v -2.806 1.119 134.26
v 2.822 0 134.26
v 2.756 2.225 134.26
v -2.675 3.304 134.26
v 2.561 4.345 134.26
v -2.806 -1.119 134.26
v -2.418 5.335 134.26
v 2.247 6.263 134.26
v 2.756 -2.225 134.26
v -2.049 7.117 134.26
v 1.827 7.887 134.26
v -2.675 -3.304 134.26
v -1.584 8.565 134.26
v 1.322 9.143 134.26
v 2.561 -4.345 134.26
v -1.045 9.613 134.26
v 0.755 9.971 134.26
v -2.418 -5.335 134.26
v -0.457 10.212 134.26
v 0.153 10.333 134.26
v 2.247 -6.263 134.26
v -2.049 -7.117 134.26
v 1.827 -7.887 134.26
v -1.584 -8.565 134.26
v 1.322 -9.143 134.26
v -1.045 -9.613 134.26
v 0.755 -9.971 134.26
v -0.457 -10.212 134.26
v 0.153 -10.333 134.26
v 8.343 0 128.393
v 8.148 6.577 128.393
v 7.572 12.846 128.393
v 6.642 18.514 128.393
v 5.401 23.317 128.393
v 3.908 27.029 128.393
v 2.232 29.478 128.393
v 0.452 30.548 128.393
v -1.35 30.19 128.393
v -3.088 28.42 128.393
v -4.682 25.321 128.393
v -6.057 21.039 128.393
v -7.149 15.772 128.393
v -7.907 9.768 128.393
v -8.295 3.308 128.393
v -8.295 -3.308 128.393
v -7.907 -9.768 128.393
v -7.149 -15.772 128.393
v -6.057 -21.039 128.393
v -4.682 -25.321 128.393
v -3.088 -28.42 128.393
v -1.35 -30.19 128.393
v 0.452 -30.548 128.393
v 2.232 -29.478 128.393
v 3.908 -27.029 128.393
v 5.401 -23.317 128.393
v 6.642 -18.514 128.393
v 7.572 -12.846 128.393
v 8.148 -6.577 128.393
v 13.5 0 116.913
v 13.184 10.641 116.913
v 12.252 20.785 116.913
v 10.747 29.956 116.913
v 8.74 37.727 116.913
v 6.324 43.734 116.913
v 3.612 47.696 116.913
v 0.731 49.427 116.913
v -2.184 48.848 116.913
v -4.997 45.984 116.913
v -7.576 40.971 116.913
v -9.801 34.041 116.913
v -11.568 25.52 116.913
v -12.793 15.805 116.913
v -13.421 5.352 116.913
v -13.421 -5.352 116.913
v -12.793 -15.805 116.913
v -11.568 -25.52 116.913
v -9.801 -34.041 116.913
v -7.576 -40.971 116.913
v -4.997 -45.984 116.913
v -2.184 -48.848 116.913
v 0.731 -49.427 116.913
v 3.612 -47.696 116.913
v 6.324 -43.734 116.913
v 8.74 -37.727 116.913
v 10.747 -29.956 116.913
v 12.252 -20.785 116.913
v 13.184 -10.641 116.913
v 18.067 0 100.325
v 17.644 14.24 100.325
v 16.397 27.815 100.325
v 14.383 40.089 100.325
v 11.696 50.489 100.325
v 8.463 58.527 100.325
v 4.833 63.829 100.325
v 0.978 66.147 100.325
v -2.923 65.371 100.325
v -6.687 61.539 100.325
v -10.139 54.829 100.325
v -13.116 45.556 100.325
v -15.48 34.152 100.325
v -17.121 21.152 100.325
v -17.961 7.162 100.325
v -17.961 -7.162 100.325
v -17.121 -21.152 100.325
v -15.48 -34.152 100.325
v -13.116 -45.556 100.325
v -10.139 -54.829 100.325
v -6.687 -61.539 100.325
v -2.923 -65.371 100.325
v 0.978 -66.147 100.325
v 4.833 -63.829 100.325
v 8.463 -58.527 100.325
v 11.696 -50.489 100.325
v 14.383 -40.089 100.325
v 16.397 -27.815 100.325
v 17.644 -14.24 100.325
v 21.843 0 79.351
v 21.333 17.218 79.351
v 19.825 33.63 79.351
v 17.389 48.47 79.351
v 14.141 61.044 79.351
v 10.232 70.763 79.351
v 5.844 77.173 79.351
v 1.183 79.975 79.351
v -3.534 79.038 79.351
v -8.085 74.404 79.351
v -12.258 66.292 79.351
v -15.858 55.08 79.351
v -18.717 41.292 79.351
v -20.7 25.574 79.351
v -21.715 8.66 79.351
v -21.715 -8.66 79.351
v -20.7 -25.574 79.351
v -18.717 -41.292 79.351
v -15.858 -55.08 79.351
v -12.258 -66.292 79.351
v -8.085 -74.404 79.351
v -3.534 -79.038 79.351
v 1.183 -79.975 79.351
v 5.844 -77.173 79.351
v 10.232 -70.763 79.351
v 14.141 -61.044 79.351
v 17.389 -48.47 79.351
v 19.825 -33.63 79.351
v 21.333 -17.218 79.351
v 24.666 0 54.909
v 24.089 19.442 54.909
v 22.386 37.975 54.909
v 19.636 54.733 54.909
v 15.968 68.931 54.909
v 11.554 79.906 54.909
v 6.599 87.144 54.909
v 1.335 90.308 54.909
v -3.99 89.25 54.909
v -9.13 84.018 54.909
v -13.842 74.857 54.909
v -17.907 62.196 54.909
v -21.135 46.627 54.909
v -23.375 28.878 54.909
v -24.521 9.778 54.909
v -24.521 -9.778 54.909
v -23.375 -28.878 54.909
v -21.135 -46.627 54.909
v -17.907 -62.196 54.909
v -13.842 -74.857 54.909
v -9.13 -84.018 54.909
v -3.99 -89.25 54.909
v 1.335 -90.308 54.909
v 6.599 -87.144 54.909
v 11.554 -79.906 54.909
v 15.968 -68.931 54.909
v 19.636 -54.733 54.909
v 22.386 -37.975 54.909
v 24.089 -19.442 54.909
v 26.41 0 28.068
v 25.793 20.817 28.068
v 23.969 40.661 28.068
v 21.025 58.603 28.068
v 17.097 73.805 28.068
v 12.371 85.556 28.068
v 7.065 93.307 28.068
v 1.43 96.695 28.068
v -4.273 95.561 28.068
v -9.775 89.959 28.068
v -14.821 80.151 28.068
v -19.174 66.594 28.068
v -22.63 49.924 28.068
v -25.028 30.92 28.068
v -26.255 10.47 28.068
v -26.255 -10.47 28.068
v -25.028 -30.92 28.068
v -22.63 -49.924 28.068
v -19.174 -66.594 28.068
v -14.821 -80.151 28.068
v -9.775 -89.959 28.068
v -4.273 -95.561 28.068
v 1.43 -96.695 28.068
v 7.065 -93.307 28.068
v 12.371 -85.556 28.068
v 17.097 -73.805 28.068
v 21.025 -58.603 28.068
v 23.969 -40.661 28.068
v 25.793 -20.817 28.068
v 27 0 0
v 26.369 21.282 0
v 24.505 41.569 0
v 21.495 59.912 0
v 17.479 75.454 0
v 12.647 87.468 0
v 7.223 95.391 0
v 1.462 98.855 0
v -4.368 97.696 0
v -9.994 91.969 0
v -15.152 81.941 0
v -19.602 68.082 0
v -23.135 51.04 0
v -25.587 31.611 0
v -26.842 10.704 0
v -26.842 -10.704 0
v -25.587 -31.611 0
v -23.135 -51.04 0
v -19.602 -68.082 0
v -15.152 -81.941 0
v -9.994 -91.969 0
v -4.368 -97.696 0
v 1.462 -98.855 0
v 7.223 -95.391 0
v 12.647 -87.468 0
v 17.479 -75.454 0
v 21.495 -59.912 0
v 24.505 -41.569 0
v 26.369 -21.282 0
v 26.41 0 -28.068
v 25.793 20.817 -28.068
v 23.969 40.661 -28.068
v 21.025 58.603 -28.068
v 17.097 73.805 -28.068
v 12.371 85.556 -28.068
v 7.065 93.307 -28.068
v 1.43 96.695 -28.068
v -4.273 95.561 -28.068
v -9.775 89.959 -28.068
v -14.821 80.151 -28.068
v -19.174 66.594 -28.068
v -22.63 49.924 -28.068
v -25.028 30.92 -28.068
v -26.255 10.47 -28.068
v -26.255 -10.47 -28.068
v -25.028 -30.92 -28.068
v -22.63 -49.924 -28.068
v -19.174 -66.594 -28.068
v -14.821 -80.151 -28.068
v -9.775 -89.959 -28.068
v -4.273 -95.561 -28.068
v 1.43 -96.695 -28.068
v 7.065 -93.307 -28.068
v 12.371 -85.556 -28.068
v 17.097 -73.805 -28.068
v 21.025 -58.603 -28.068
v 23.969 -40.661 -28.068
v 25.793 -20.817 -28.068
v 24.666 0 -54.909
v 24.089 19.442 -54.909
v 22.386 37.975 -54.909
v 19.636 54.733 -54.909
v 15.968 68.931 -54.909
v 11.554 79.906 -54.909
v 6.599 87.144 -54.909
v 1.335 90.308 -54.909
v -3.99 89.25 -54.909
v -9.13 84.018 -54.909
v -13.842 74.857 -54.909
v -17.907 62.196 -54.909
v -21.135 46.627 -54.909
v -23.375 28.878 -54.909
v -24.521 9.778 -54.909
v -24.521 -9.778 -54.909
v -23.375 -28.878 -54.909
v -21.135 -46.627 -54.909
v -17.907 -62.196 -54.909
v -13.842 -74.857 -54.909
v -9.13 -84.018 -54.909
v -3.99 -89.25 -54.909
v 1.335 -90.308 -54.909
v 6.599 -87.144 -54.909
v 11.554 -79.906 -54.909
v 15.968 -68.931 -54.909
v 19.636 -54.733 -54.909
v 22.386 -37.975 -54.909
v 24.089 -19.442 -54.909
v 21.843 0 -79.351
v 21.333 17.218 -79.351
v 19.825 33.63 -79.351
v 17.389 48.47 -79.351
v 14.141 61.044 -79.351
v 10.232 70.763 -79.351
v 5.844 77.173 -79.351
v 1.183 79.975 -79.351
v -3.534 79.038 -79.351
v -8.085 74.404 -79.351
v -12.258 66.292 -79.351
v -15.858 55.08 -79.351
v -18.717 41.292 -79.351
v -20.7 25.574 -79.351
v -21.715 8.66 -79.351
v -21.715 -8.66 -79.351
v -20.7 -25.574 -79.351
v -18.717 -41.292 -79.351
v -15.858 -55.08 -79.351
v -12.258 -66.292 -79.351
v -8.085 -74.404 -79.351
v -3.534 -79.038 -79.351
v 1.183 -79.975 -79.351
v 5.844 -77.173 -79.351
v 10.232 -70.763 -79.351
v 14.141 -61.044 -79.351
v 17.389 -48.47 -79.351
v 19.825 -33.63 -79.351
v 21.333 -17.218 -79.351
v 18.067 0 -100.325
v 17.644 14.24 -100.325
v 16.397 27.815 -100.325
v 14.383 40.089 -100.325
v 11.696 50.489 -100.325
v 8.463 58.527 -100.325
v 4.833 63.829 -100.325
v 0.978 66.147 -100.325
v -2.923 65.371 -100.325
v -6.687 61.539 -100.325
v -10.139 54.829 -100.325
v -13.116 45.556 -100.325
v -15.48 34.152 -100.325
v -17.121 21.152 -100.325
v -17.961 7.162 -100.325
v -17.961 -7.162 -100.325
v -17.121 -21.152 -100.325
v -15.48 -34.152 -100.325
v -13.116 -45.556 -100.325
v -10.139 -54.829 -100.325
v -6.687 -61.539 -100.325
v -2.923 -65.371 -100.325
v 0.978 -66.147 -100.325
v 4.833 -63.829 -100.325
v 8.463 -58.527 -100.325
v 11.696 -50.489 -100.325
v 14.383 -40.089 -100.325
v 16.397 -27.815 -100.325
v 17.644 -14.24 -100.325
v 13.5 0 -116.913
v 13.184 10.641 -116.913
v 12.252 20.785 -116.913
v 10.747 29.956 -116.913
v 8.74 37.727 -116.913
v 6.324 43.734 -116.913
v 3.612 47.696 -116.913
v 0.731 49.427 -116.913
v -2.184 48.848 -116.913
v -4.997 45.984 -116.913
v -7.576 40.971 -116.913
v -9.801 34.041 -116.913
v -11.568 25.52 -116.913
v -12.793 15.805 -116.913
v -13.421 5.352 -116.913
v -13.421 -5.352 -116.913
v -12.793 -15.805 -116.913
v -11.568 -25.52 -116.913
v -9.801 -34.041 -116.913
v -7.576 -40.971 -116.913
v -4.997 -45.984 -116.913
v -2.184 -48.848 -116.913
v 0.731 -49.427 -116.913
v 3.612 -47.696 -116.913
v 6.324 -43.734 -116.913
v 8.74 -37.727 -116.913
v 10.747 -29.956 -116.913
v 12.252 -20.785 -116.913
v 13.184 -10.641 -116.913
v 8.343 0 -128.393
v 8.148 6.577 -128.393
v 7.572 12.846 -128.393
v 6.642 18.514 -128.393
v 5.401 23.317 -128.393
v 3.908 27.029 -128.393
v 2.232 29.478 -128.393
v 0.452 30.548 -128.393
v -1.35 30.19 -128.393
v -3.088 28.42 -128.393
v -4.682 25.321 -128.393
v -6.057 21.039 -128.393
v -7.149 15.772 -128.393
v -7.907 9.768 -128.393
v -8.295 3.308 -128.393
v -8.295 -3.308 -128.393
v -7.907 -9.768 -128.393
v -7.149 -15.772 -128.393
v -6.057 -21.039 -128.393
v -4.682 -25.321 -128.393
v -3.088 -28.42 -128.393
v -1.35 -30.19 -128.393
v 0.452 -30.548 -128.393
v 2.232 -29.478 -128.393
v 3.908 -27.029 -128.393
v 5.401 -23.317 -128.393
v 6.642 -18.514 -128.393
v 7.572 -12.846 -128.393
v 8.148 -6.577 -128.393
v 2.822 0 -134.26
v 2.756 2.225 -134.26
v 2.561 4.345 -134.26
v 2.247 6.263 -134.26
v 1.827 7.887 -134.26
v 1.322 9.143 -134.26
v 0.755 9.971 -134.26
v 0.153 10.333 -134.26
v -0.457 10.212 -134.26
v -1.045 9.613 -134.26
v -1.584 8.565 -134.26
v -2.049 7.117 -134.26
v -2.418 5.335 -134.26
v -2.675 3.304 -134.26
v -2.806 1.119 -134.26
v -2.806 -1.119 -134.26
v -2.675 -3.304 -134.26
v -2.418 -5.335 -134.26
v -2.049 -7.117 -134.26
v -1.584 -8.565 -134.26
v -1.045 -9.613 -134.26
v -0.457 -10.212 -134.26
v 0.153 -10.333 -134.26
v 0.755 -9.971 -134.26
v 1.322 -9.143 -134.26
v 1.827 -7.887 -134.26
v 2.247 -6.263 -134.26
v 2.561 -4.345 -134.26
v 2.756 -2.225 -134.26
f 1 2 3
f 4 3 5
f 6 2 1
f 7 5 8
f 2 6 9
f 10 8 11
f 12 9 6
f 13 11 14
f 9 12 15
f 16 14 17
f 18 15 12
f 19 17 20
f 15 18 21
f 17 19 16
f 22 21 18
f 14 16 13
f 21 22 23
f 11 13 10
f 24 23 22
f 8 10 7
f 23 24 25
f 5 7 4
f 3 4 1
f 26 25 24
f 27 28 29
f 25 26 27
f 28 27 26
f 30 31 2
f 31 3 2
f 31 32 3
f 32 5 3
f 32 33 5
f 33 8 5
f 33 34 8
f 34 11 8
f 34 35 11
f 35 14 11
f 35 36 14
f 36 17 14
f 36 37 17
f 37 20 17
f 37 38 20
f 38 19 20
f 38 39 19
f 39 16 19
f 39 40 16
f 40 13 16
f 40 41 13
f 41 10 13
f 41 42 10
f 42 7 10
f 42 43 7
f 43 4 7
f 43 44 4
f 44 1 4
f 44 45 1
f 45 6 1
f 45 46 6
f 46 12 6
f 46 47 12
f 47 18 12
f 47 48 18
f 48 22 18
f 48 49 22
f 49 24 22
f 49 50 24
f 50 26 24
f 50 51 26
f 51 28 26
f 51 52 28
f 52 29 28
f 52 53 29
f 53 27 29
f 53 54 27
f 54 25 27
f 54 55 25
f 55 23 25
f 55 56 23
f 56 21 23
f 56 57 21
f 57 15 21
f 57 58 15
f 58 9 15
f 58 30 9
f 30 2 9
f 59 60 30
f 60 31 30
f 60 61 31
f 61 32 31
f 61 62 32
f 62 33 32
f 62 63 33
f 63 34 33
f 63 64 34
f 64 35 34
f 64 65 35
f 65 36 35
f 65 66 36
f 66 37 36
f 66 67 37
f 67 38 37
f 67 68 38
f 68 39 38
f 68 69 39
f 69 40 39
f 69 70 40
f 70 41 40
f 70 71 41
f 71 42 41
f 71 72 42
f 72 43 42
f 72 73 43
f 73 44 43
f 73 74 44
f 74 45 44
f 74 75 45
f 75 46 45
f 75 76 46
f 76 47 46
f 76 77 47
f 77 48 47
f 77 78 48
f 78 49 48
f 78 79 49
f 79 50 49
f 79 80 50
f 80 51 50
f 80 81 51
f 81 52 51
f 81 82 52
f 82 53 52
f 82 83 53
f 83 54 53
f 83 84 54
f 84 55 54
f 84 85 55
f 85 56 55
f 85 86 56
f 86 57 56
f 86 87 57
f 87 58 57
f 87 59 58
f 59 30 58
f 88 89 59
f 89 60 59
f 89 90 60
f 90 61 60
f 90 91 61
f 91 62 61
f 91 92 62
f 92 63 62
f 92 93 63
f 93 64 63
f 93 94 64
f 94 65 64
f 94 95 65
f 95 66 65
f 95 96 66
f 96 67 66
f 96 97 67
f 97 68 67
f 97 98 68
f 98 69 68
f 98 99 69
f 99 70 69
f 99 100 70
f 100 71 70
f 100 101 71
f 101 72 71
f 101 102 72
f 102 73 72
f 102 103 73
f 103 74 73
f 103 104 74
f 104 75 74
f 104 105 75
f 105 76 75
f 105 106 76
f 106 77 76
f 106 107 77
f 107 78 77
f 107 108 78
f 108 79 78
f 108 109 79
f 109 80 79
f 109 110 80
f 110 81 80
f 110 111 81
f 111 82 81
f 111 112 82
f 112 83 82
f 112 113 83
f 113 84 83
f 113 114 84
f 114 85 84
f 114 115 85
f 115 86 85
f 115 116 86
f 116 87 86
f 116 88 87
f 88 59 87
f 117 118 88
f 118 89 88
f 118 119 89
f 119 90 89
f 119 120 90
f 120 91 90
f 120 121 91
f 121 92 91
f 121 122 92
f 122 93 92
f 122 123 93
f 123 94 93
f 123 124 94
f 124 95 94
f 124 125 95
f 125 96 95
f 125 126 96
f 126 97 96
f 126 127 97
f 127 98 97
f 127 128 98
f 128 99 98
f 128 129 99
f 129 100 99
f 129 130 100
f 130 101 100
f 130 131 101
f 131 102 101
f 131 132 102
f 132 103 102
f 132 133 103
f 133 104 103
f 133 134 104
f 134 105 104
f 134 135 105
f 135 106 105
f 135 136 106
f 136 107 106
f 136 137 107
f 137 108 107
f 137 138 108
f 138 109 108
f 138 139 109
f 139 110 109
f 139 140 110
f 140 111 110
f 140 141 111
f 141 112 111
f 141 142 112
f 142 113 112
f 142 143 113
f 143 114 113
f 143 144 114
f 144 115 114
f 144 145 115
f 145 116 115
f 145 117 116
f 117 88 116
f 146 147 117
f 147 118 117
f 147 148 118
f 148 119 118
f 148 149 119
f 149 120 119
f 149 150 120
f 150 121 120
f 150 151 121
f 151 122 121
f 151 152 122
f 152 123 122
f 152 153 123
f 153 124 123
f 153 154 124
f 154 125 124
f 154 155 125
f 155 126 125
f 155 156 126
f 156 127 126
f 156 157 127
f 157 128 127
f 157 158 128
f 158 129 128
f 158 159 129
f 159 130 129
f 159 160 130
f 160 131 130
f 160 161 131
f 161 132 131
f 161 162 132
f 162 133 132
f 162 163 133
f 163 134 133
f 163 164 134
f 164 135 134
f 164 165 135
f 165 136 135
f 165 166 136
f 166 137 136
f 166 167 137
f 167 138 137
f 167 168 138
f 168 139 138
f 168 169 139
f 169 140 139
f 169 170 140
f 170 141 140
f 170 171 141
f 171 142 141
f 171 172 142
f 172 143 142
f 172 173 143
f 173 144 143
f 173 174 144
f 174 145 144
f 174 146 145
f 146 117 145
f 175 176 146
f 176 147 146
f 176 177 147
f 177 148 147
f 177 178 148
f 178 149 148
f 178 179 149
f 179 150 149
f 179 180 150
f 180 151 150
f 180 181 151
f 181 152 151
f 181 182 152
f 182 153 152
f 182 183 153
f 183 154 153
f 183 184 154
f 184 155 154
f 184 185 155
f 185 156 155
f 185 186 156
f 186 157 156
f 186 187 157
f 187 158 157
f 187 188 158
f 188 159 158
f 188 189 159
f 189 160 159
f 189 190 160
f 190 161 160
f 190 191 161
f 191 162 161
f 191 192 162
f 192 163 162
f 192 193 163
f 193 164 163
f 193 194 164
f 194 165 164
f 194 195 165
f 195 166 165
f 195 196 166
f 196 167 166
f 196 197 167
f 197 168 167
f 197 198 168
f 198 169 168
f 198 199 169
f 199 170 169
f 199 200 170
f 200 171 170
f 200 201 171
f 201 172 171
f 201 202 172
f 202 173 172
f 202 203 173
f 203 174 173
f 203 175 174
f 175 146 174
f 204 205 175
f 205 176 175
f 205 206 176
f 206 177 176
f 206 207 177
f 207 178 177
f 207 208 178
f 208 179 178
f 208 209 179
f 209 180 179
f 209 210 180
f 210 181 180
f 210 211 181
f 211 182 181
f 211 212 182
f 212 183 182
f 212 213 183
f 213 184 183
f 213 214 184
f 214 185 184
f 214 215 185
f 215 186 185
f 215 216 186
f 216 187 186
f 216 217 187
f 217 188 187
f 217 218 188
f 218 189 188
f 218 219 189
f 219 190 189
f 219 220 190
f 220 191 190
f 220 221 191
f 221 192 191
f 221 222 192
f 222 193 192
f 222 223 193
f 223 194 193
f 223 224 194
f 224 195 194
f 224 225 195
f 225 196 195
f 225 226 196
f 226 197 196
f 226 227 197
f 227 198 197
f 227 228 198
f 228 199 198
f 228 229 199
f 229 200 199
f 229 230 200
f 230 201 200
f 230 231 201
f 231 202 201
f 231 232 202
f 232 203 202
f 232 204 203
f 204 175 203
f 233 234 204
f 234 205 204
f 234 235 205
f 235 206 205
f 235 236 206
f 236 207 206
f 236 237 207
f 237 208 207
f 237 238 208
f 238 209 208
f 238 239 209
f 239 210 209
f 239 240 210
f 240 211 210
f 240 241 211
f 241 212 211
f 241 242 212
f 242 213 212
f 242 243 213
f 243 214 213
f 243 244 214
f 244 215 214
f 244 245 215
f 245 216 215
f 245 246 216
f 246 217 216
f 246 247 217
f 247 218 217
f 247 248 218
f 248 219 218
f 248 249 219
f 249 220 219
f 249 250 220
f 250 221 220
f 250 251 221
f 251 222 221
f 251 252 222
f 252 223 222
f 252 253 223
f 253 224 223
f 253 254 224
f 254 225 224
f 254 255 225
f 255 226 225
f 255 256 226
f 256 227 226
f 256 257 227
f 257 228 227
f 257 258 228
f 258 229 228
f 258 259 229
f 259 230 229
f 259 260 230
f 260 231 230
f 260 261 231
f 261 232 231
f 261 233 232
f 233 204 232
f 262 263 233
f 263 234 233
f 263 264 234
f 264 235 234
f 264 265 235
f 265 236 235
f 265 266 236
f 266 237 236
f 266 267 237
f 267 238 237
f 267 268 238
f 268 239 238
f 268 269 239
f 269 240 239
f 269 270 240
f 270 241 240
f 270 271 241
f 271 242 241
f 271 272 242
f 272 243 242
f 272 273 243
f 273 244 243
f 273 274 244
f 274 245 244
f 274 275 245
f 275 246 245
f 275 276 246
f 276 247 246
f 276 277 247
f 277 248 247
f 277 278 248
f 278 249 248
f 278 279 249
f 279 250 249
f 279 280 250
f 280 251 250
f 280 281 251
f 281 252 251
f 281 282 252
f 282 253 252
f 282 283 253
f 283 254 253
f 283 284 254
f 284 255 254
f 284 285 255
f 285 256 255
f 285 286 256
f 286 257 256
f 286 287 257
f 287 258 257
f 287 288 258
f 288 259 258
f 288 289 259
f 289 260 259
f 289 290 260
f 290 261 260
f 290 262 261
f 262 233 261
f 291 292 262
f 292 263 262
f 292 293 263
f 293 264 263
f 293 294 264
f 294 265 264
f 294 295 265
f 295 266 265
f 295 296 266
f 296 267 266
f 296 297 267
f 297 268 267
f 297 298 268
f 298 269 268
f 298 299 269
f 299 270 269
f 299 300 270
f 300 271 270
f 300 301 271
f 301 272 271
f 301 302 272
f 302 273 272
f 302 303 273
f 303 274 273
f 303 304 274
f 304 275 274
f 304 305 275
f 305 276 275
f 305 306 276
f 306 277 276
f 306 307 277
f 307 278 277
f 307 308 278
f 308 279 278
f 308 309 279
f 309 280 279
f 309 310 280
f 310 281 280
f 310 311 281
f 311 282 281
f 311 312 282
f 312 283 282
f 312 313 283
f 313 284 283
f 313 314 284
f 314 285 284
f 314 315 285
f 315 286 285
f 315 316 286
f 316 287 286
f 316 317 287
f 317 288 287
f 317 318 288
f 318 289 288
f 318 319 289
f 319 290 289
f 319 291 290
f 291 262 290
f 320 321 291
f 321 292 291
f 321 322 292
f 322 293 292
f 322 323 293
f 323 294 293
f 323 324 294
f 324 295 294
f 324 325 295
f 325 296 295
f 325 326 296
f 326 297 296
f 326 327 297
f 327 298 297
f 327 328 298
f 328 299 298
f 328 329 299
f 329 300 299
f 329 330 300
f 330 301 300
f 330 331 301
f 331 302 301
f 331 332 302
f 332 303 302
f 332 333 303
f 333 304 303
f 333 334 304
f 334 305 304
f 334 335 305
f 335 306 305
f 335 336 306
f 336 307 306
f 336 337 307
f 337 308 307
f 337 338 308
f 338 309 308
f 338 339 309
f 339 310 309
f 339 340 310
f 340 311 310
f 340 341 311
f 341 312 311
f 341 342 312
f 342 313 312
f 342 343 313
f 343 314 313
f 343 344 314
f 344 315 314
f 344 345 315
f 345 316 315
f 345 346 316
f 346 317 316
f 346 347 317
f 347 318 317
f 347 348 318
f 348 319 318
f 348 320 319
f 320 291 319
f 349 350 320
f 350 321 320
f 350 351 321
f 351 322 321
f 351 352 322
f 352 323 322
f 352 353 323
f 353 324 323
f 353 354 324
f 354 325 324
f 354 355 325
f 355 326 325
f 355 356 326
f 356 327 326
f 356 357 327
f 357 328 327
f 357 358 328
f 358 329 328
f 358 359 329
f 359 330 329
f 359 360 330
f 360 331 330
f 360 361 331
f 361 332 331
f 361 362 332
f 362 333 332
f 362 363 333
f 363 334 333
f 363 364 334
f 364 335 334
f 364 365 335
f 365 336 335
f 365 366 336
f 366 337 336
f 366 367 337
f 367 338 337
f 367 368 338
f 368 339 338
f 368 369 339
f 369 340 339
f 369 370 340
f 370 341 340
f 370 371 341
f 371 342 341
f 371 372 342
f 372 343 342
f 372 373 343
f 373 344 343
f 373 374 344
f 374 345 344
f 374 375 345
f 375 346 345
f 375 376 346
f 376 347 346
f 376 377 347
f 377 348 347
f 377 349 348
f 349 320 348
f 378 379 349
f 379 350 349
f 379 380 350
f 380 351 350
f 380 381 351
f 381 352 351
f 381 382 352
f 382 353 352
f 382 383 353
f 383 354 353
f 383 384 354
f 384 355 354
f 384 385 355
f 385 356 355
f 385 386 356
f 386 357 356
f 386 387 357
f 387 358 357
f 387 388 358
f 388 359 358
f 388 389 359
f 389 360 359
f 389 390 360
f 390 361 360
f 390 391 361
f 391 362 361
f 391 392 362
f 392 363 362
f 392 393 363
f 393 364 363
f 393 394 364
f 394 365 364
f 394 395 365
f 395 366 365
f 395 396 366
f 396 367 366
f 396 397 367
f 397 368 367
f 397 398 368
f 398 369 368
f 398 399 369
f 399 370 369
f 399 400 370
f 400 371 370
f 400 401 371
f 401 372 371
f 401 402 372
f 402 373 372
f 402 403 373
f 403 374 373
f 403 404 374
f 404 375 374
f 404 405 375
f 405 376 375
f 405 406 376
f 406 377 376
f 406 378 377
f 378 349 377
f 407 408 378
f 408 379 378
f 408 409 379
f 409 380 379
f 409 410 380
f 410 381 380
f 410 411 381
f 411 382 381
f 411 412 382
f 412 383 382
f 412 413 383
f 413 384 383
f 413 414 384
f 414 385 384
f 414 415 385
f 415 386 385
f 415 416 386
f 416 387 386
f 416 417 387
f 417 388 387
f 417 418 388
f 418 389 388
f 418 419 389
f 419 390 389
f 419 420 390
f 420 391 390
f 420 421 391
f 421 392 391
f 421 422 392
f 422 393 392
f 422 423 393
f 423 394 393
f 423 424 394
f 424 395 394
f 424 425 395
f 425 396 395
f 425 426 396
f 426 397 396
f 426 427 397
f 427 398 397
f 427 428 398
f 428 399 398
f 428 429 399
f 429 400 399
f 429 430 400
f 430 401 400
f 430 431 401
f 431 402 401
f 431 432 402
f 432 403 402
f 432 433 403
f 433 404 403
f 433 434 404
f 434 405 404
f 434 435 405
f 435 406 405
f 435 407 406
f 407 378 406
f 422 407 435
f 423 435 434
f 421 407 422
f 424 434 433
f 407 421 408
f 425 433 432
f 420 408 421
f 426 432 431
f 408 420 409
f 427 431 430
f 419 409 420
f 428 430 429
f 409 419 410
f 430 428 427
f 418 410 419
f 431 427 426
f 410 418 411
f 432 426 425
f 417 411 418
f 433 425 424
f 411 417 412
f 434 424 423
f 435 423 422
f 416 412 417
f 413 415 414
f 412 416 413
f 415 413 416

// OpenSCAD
// Generated by SolidPython 1.0.1 on 2020-07-29 00:46:45


scale(v = [3, 11, 15]) {
	sphere(r = 9);
}
/***********************************************
*********      SolidPython code:      **********
************************************************
 
# import packages: SolidPython
from solid import *
from solid.utils import *
from itertools import chain, combinations, permutations


class Resize:

    def __init__(self, scad_file):
        self.scad_file = scad_file
        #self.scad_file = import_scad(scad_file)
        # cone/cylinder param:
        self.r1 = 0
        self.r2 = 0
        self.h = 0
        # rectangular prism param:
        self.w = 0
        self.l = 0
        # ellipse param:
        self.r = 0

    # import OpenScad code (file name corresponds to shape)


    # classify shape + parameters
    def assign(self, param1, param2, param3):
        if self.scad_file == 'cone.scad':
            self.r1 = param1
            self.r2 = param2
            self.h = param3
        elif self.scad_file == 'cylinder.scad':
            self.r1 = param1
            self.r2 = param2
            self.h = param3
        elif self.scad_file == 'rectangularPrism.scad':
            self.h = param1
            self.l = param2
            self.w = param3
        else:
            self.r = param1
            self.h = param2

    # resize parameters
    def iterate(self):
        x = range(3, 20, 2)
        i = 1
        if self.scad_file == 'cone.scad':
            tempList = list(permutations(x, 2))
            for temp in tempList:
                param1 = temp[0]
                param2 = temp[1]
                filepath = 'produced_scad_files/' + 'cone' + str(param1) + '_' + str(param2) + '_' + '.scad'
                scad_render_to_file(cylinder(h=param1, r1=param2, r2=0), filepath)

        elif self.scad_file == 'cylinder.scad':
            tempList = list(permutations(x, 3))
            for temp in tempList:
                param1 = temp[0]
                param2 = temp[1]
                filepath = 'produced_scad_files/' + 'cylinder' + str(param1) + '_' + str(param2) + '_' + '.scad'
                scad_render_to_file(cylinder(h=param1, r1=param2, r2=param2), filepath)

        elif self.scad_file == 'rectangularPrism.scad':
            tempList = list(permutations(x, 3))
            for temp in tempList:
                param1 = temp[0]
                param2 = temp[1]
                param3 = temp[2]
                filepath = 'produced_scad_files/' + 'rectangularPrism' + str(param1) + '_' + str(param2) + '_' + str(
                    param3) + '.scad'
                scad_render_to_file(cube(size=(param1, param2, param3)), filepath)

        elif self.scad_file == 'ellipse.scad':
            tempList = list(permutations(x, 4))
            for temp in tempList:
                param1 = temp[0]
                param2 = temp[1]
                param3 = temp[2]
                param4 = temp[3]
                filepath = 'produced_scad_files/' + 'ellipse' + str(param1) + '_' + str(param2) + '_' + str(param3) + '_' + str(param4) + '.scad'
                scad_render_to_file(scale([param1, param2, param3])(sphere(r=param4)), filepath)

    def render_to_scadfile(self):
        scad_render_to_file(scad, 'example.scad') 
 
************************************************/
